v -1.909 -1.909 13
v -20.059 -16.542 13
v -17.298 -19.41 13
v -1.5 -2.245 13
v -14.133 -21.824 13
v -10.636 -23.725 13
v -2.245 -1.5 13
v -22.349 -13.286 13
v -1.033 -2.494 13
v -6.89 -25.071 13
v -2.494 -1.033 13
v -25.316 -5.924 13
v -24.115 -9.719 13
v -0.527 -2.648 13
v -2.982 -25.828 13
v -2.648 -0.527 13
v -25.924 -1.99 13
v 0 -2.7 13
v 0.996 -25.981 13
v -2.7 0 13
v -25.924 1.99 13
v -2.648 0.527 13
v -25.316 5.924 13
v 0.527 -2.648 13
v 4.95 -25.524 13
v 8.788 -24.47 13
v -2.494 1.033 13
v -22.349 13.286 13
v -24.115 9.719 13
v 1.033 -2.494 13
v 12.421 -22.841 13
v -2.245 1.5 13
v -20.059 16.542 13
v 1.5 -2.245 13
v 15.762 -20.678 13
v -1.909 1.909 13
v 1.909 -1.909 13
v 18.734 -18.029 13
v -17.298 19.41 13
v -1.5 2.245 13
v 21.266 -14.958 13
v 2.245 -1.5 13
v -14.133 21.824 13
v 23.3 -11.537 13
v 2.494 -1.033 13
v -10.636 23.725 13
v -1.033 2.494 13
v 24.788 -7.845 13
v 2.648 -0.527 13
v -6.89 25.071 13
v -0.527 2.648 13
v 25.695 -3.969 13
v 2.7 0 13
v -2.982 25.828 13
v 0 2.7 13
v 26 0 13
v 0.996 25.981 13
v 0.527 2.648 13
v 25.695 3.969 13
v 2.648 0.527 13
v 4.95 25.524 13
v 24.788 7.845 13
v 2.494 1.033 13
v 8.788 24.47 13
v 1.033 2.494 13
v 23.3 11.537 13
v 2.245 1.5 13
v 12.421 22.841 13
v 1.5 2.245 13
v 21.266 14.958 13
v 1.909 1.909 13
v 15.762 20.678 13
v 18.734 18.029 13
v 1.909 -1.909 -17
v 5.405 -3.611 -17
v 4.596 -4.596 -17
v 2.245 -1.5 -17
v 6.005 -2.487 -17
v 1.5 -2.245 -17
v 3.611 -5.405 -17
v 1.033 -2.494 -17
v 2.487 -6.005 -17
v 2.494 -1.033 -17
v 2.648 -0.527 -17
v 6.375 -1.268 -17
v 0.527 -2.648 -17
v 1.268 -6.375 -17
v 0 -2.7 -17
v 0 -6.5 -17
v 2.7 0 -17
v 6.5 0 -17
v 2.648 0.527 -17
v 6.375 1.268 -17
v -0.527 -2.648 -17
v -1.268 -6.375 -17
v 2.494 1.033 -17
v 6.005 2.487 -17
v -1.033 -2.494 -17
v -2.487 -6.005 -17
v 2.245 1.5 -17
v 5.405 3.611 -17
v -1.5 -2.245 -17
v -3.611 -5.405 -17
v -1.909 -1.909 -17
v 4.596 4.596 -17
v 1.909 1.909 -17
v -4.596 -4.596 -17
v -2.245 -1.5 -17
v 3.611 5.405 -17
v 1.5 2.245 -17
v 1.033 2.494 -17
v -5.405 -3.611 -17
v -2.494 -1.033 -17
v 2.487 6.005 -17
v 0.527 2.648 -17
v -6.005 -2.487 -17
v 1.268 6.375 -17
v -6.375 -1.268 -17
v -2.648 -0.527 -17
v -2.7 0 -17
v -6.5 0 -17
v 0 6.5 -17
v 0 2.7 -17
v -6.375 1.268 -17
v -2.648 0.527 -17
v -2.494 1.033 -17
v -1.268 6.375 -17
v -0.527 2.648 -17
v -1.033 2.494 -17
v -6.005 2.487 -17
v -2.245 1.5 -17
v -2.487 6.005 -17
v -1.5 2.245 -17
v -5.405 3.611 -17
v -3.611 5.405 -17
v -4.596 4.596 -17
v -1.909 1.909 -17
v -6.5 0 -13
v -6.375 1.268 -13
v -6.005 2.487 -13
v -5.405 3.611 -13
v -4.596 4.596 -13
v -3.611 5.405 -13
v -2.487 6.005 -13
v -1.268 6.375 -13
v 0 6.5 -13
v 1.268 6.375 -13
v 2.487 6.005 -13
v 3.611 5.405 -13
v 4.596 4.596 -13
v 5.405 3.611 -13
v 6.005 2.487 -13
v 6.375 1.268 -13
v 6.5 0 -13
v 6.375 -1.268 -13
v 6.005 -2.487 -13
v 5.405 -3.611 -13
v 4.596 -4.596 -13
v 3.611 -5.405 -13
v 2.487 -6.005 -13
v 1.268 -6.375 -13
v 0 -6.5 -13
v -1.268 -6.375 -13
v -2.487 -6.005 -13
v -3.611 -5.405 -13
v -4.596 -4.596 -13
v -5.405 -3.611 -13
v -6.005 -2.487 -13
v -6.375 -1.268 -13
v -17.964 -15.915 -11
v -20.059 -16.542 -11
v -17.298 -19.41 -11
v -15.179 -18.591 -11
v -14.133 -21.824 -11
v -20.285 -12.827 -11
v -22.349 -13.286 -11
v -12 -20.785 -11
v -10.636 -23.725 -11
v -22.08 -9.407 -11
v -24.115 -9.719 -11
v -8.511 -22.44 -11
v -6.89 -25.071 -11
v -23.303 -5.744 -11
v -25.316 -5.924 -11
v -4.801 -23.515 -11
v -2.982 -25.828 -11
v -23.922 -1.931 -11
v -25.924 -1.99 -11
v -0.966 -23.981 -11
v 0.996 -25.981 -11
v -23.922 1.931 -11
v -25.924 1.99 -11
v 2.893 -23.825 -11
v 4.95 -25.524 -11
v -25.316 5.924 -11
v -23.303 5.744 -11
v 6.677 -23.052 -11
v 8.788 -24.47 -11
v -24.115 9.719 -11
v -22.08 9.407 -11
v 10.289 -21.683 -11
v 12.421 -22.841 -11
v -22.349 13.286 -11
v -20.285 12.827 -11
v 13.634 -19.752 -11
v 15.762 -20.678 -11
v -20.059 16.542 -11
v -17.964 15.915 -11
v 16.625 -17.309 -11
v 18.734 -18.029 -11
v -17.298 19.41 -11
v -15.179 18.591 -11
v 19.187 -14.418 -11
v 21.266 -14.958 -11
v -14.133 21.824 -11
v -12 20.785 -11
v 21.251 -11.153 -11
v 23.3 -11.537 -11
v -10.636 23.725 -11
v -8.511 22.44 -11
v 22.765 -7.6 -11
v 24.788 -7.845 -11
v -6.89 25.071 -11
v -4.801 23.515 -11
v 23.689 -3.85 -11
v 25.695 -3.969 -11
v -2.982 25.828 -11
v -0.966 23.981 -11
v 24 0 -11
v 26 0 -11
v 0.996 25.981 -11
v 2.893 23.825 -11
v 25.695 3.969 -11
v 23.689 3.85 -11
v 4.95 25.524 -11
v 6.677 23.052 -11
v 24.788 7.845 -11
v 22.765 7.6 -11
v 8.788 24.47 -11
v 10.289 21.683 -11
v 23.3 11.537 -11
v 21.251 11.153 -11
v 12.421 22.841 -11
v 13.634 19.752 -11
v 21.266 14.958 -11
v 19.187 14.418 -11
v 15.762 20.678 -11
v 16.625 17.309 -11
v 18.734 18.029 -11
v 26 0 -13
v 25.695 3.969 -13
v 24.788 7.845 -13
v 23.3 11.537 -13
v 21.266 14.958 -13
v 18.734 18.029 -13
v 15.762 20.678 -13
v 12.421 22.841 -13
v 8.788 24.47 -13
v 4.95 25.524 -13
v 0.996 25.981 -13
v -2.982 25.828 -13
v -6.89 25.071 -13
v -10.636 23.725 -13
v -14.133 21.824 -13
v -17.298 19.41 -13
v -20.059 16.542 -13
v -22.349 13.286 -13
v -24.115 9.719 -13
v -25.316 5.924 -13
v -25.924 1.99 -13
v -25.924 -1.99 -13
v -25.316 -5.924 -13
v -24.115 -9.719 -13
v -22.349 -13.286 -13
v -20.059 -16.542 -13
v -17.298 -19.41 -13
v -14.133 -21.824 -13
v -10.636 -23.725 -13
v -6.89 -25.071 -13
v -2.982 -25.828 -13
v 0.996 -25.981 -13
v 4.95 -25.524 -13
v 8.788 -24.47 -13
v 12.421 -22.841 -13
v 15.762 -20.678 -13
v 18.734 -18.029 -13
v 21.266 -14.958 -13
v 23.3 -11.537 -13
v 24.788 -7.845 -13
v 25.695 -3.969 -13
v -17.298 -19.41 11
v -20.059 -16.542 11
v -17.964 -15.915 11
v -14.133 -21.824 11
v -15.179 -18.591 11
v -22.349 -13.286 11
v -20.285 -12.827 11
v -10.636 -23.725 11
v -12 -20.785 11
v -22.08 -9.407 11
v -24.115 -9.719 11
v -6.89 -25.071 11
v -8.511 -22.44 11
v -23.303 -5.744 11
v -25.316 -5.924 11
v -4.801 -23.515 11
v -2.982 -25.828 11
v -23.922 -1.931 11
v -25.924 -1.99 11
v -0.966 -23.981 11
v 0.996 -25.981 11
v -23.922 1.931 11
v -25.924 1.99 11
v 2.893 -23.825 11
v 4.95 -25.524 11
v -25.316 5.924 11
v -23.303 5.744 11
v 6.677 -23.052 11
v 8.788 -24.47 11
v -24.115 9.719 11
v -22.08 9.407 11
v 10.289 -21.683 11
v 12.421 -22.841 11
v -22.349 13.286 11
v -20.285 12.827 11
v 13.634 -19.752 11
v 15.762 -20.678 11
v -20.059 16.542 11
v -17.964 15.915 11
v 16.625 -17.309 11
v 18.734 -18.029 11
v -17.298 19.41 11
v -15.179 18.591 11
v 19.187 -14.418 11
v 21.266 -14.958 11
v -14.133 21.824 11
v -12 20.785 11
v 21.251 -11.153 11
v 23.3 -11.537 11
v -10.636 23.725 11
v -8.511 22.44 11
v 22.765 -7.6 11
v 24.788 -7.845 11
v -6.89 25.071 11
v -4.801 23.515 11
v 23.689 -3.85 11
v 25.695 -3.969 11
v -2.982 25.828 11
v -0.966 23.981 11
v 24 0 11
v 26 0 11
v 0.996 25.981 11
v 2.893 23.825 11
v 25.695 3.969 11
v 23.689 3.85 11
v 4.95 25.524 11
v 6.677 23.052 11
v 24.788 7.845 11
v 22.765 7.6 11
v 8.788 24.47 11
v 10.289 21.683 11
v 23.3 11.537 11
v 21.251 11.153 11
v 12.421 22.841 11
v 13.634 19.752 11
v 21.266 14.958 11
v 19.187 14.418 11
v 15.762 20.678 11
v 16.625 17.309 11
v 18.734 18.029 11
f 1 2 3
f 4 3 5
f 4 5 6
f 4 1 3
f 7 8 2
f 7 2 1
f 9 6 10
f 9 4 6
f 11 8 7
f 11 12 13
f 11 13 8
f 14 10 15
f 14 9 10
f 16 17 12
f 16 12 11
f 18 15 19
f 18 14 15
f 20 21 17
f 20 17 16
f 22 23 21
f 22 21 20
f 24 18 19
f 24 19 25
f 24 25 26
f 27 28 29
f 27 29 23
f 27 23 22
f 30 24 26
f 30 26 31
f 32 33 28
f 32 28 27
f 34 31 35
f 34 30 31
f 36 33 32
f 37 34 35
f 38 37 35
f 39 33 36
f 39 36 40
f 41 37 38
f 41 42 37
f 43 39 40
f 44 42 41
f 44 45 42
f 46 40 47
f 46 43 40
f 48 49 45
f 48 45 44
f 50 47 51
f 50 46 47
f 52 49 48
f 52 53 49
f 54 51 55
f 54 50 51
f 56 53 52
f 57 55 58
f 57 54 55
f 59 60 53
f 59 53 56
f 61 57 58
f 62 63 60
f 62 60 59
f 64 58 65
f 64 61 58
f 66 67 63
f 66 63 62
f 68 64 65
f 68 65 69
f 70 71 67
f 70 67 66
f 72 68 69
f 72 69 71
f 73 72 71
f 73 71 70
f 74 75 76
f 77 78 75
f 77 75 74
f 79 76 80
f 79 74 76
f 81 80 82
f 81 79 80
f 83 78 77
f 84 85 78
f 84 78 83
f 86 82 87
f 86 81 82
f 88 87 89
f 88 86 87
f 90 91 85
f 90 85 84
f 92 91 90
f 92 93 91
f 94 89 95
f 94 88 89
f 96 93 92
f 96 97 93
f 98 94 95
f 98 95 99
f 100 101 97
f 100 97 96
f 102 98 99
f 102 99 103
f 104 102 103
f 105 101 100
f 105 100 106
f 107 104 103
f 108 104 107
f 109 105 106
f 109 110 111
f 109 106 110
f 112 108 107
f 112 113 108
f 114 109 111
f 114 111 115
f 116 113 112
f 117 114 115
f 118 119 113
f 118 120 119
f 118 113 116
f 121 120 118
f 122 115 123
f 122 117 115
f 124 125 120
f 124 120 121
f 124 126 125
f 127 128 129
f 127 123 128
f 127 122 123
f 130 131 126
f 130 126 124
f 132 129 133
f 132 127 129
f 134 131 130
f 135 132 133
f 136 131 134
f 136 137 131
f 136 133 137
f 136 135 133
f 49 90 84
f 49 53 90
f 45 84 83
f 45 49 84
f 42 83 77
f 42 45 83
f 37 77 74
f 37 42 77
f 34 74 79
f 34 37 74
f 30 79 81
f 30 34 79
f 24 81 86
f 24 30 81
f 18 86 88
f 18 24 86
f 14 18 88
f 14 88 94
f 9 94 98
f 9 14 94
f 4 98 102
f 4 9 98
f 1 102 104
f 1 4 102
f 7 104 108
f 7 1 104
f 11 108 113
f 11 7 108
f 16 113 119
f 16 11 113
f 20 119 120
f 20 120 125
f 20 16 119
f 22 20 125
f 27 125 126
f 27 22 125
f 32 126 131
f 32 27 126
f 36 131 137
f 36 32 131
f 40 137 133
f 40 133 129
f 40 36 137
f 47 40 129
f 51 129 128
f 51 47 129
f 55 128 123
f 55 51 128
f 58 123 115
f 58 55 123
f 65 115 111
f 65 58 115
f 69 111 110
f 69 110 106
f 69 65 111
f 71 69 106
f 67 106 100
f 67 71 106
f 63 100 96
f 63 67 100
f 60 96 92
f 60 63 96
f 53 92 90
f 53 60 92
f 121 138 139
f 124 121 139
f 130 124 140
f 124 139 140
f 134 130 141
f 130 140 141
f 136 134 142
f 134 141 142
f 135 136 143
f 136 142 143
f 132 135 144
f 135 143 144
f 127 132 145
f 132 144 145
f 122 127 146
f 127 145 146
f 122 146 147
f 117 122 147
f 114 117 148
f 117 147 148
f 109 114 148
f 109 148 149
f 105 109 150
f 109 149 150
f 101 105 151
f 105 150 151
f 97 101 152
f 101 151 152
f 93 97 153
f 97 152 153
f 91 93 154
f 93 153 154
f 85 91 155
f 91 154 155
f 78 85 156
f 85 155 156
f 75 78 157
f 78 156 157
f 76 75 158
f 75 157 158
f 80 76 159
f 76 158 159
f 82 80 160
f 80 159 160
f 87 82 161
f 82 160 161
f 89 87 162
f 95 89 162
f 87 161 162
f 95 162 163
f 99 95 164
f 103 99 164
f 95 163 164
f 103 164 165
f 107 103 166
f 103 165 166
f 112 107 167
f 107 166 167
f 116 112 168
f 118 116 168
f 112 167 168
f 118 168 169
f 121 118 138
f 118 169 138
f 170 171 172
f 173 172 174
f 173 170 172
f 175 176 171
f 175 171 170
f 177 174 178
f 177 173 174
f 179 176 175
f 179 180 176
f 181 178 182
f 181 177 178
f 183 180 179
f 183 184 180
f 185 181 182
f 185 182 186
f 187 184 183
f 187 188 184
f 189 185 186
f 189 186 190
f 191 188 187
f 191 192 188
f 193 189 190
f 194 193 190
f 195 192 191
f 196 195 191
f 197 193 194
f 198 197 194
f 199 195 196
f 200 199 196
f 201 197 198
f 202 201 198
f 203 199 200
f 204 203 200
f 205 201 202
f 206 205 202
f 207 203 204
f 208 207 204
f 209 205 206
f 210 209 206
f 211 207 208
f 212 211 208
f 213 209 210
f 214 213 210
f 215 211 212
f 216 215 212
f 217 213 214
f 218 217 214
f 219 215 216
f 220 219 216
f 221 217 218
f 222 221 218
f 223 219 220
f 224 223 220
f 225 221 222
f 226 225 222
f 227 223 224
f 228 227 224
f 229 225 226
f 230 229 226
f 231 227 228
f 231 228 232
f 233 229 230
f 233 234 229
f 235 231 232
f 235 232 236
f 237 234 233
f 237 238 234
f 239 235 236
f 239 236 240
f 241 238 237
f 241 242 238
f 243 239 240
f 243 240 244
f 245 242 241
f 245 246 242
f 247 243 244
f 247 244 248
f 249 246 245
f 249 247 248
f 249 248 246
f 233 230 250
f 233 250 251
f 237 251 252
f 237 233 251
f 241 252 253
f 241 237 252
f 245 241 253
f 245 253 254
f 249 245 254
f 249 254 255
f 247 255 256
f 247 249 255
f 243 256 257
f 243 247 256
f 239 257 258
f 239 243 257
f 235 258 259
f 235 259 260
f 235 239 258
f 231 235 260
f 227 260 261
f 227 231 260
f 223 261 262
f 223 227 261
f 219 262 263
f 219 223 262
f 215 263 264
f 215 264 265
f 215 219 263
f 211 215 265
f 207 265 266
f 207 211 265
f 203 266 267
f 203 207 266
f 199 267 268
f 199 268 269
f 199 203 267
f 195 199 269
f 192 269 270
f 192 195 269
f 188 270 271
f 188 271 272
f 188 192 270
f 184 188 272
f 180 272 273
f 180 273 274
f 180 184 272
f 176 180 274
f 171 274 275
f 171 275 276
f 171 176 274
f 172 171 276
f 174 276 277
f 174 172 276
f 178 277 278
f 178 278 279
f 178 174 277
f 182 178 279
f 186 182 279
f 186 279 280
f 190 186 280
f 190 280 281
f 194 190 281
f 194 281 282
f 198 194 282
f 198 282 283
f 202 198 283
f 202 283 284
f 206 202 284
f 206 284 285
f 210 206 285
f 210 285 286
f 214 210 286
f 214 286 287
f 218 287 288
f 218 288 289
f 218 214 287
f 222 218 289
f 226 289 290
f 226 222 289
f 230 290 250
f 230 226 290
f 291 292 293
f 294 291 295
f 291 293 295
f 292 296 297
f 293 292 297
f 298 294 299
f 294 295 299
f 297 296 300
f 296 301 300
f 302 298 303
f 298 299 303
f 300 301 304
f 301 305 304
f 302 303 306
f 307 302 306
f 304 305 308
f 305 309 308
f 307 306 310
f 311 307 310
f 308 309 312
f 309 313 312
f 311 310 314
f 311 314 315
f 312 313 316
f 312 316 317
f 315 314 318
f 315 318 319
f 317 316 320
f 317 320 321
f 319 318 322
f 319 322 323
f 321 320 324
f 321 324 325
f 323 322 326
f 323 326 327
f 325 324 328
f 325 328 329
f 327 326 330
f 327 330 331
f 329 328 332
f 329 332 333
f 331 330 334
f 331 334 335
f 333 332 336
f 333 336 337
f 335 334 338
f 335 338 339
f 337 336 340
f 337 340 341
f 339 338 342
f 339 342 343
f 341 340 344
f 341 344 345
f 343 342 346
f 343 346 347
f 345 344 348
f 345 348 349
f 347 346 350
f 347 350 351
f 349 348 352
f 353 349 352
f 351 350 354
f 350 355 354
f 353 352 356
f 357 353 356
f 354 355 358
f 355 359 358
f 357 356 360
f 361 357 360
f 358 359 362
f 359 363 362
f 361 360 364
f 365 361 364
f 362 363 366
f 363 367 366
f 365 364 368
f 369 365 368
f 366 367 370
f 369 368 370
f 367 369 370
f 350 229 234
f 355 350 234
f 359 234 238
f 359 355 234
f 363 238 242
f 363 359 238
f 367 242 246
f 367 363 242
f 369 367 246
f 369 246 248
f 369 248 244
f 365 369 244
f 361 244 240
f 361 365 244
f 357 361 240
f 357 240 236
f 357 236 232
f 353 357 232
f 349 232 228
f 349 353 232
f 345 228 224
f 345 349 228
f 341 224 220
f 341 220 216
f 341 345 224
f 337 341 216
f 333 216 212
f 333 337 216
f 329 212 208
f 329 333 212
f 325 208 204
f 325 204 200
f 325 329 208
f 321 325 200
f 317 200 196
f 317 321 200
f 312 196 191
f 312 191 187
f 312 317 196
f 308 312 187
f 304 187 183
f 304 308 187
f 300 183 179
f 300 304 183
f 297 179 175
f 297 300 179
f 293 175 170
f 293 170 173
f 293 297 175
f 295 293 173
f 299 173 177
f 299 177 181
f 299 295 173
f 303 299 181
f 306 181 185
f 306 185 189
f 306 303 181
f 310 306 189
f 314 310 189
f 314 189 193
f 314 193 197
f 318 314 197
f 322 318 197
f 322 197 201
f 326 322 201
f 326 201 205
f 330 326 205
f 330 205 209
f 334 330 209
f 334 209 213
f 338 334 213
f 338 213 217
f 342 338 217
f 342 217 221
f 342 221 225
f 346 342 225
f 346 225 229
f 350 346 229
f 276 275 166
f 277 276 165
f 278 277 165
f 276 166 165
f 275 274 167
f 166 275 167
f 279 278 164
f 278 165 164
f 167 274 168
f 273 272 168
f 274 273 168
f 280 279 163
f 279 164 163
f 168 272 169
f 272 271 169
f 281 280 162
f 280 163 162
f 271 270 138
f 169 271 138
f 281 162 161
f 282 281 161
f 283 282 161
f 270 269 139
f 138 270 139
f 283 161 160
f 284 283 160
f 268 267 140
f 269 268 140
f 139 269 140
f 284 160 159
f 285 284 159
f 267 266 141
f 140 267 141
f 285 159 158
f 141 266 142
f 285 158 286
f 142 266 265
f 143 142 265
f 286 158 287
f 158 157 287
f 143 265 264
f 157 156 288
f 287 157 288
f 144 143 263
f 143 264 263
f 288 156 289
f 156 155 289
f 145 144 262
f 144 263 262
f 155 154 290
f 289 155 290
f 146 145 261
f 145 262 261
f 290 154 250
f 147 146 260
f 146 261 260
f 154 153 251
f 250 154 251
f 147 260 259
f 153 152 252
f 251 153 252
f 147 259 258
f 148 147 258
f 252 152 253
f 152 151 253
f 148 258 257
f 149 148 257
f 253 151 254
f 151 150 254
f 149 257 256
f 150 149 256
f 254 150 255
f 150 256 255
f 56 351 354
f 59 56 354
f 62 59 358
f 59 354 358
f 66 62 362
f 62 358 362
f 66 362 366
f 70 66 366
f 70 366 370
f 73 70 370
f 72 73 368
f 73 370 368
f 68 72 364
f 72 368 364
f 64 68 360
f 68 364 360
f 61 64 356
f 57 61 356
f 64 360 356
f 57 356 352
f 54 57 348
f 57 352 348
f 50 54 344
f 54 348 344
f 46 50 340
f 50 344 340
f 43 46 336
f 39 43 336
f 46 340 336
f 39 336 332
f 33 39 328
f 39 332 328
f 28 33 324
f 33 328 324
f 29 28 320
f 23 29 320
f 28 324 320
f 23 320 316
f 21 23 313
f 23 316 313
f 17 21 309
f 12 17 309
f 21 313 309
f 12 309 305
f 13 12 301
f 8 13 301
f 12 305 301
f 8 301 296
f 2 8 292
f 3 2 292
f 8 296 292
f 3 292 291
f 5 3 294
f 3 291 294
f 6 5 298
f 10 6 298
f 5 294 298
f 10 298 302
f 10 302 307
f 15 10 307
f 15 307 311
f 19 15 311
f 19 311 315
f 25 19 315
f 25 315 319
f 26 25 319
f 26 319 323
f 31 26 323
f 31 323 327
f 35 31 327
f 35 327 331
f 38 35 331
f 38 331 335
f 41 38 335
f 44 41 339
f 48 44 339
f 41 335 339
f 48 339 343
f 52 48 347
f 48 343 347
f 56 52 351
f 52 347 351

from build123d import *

# Parameters (mm, degrees)
SKETCH1_R           = 24
BOSS_EXTRUDE1_DEPTH = 11
SKETCH3_R           = 26
BOSS_EXTRUDE2_DEPTH = 2
SKETCH5_R           = 2.7
CUT_EXTRUDE1_DEPTH  = 46.033320997
SKETCH6_R           = 6.5
SKETCH6_R_2         = 2.7
BOSS_EXTRUDE3_DEPTH = 4


with BuildPart() as part:
    # Sketch1 → Boss-Extrude1 (new, symmetric)
    with BuildSketch(Plane.XY):
        Circle(SKETCH1_R)
    extrude(amount=BOSS_EXTRUDE1_DEPTH, both=True)

    # Sketch3 → Boss-Extrude2 (add)
    with BuildSketch(Plane.XY.offset(11)):
        Circle(SKETCH3_R)
    boss_extrude2 = extrude(amount=BOSS_EXTRUDE2_DEPTH)

    # Mirror1: Boss-Extrude2 across plane
    add(boss_extrude2.mirror(Plane.XY))

    # Sketch5 → Cut-Extrude1 (cut, through all)
    with BuildSketch(Plane.XY.offset(13)):
        Circle(SKETCH5_R)
    extrude(amount=-CUT_EXTRUDE1_DEPTH, mode=Mode.SUBTRACT)

    # Sketch6 → Boss-Extrude3 (add)
    with BuildSketch(Plane(origin=(0, 0, -13), x_dir=(-1, 0, 0), z_dir=(0, 0, -1))):
        Circle(SKETCH6_R)
        with Locations(Location((0, 0, 0), (0, 0, 180))):
            Circle(SKETCH6_R_2, mode=Mode.SUBTRACT)
    extrude(amount=BOSS_EXTRUDE3_DEPTH)


solid = part.part
